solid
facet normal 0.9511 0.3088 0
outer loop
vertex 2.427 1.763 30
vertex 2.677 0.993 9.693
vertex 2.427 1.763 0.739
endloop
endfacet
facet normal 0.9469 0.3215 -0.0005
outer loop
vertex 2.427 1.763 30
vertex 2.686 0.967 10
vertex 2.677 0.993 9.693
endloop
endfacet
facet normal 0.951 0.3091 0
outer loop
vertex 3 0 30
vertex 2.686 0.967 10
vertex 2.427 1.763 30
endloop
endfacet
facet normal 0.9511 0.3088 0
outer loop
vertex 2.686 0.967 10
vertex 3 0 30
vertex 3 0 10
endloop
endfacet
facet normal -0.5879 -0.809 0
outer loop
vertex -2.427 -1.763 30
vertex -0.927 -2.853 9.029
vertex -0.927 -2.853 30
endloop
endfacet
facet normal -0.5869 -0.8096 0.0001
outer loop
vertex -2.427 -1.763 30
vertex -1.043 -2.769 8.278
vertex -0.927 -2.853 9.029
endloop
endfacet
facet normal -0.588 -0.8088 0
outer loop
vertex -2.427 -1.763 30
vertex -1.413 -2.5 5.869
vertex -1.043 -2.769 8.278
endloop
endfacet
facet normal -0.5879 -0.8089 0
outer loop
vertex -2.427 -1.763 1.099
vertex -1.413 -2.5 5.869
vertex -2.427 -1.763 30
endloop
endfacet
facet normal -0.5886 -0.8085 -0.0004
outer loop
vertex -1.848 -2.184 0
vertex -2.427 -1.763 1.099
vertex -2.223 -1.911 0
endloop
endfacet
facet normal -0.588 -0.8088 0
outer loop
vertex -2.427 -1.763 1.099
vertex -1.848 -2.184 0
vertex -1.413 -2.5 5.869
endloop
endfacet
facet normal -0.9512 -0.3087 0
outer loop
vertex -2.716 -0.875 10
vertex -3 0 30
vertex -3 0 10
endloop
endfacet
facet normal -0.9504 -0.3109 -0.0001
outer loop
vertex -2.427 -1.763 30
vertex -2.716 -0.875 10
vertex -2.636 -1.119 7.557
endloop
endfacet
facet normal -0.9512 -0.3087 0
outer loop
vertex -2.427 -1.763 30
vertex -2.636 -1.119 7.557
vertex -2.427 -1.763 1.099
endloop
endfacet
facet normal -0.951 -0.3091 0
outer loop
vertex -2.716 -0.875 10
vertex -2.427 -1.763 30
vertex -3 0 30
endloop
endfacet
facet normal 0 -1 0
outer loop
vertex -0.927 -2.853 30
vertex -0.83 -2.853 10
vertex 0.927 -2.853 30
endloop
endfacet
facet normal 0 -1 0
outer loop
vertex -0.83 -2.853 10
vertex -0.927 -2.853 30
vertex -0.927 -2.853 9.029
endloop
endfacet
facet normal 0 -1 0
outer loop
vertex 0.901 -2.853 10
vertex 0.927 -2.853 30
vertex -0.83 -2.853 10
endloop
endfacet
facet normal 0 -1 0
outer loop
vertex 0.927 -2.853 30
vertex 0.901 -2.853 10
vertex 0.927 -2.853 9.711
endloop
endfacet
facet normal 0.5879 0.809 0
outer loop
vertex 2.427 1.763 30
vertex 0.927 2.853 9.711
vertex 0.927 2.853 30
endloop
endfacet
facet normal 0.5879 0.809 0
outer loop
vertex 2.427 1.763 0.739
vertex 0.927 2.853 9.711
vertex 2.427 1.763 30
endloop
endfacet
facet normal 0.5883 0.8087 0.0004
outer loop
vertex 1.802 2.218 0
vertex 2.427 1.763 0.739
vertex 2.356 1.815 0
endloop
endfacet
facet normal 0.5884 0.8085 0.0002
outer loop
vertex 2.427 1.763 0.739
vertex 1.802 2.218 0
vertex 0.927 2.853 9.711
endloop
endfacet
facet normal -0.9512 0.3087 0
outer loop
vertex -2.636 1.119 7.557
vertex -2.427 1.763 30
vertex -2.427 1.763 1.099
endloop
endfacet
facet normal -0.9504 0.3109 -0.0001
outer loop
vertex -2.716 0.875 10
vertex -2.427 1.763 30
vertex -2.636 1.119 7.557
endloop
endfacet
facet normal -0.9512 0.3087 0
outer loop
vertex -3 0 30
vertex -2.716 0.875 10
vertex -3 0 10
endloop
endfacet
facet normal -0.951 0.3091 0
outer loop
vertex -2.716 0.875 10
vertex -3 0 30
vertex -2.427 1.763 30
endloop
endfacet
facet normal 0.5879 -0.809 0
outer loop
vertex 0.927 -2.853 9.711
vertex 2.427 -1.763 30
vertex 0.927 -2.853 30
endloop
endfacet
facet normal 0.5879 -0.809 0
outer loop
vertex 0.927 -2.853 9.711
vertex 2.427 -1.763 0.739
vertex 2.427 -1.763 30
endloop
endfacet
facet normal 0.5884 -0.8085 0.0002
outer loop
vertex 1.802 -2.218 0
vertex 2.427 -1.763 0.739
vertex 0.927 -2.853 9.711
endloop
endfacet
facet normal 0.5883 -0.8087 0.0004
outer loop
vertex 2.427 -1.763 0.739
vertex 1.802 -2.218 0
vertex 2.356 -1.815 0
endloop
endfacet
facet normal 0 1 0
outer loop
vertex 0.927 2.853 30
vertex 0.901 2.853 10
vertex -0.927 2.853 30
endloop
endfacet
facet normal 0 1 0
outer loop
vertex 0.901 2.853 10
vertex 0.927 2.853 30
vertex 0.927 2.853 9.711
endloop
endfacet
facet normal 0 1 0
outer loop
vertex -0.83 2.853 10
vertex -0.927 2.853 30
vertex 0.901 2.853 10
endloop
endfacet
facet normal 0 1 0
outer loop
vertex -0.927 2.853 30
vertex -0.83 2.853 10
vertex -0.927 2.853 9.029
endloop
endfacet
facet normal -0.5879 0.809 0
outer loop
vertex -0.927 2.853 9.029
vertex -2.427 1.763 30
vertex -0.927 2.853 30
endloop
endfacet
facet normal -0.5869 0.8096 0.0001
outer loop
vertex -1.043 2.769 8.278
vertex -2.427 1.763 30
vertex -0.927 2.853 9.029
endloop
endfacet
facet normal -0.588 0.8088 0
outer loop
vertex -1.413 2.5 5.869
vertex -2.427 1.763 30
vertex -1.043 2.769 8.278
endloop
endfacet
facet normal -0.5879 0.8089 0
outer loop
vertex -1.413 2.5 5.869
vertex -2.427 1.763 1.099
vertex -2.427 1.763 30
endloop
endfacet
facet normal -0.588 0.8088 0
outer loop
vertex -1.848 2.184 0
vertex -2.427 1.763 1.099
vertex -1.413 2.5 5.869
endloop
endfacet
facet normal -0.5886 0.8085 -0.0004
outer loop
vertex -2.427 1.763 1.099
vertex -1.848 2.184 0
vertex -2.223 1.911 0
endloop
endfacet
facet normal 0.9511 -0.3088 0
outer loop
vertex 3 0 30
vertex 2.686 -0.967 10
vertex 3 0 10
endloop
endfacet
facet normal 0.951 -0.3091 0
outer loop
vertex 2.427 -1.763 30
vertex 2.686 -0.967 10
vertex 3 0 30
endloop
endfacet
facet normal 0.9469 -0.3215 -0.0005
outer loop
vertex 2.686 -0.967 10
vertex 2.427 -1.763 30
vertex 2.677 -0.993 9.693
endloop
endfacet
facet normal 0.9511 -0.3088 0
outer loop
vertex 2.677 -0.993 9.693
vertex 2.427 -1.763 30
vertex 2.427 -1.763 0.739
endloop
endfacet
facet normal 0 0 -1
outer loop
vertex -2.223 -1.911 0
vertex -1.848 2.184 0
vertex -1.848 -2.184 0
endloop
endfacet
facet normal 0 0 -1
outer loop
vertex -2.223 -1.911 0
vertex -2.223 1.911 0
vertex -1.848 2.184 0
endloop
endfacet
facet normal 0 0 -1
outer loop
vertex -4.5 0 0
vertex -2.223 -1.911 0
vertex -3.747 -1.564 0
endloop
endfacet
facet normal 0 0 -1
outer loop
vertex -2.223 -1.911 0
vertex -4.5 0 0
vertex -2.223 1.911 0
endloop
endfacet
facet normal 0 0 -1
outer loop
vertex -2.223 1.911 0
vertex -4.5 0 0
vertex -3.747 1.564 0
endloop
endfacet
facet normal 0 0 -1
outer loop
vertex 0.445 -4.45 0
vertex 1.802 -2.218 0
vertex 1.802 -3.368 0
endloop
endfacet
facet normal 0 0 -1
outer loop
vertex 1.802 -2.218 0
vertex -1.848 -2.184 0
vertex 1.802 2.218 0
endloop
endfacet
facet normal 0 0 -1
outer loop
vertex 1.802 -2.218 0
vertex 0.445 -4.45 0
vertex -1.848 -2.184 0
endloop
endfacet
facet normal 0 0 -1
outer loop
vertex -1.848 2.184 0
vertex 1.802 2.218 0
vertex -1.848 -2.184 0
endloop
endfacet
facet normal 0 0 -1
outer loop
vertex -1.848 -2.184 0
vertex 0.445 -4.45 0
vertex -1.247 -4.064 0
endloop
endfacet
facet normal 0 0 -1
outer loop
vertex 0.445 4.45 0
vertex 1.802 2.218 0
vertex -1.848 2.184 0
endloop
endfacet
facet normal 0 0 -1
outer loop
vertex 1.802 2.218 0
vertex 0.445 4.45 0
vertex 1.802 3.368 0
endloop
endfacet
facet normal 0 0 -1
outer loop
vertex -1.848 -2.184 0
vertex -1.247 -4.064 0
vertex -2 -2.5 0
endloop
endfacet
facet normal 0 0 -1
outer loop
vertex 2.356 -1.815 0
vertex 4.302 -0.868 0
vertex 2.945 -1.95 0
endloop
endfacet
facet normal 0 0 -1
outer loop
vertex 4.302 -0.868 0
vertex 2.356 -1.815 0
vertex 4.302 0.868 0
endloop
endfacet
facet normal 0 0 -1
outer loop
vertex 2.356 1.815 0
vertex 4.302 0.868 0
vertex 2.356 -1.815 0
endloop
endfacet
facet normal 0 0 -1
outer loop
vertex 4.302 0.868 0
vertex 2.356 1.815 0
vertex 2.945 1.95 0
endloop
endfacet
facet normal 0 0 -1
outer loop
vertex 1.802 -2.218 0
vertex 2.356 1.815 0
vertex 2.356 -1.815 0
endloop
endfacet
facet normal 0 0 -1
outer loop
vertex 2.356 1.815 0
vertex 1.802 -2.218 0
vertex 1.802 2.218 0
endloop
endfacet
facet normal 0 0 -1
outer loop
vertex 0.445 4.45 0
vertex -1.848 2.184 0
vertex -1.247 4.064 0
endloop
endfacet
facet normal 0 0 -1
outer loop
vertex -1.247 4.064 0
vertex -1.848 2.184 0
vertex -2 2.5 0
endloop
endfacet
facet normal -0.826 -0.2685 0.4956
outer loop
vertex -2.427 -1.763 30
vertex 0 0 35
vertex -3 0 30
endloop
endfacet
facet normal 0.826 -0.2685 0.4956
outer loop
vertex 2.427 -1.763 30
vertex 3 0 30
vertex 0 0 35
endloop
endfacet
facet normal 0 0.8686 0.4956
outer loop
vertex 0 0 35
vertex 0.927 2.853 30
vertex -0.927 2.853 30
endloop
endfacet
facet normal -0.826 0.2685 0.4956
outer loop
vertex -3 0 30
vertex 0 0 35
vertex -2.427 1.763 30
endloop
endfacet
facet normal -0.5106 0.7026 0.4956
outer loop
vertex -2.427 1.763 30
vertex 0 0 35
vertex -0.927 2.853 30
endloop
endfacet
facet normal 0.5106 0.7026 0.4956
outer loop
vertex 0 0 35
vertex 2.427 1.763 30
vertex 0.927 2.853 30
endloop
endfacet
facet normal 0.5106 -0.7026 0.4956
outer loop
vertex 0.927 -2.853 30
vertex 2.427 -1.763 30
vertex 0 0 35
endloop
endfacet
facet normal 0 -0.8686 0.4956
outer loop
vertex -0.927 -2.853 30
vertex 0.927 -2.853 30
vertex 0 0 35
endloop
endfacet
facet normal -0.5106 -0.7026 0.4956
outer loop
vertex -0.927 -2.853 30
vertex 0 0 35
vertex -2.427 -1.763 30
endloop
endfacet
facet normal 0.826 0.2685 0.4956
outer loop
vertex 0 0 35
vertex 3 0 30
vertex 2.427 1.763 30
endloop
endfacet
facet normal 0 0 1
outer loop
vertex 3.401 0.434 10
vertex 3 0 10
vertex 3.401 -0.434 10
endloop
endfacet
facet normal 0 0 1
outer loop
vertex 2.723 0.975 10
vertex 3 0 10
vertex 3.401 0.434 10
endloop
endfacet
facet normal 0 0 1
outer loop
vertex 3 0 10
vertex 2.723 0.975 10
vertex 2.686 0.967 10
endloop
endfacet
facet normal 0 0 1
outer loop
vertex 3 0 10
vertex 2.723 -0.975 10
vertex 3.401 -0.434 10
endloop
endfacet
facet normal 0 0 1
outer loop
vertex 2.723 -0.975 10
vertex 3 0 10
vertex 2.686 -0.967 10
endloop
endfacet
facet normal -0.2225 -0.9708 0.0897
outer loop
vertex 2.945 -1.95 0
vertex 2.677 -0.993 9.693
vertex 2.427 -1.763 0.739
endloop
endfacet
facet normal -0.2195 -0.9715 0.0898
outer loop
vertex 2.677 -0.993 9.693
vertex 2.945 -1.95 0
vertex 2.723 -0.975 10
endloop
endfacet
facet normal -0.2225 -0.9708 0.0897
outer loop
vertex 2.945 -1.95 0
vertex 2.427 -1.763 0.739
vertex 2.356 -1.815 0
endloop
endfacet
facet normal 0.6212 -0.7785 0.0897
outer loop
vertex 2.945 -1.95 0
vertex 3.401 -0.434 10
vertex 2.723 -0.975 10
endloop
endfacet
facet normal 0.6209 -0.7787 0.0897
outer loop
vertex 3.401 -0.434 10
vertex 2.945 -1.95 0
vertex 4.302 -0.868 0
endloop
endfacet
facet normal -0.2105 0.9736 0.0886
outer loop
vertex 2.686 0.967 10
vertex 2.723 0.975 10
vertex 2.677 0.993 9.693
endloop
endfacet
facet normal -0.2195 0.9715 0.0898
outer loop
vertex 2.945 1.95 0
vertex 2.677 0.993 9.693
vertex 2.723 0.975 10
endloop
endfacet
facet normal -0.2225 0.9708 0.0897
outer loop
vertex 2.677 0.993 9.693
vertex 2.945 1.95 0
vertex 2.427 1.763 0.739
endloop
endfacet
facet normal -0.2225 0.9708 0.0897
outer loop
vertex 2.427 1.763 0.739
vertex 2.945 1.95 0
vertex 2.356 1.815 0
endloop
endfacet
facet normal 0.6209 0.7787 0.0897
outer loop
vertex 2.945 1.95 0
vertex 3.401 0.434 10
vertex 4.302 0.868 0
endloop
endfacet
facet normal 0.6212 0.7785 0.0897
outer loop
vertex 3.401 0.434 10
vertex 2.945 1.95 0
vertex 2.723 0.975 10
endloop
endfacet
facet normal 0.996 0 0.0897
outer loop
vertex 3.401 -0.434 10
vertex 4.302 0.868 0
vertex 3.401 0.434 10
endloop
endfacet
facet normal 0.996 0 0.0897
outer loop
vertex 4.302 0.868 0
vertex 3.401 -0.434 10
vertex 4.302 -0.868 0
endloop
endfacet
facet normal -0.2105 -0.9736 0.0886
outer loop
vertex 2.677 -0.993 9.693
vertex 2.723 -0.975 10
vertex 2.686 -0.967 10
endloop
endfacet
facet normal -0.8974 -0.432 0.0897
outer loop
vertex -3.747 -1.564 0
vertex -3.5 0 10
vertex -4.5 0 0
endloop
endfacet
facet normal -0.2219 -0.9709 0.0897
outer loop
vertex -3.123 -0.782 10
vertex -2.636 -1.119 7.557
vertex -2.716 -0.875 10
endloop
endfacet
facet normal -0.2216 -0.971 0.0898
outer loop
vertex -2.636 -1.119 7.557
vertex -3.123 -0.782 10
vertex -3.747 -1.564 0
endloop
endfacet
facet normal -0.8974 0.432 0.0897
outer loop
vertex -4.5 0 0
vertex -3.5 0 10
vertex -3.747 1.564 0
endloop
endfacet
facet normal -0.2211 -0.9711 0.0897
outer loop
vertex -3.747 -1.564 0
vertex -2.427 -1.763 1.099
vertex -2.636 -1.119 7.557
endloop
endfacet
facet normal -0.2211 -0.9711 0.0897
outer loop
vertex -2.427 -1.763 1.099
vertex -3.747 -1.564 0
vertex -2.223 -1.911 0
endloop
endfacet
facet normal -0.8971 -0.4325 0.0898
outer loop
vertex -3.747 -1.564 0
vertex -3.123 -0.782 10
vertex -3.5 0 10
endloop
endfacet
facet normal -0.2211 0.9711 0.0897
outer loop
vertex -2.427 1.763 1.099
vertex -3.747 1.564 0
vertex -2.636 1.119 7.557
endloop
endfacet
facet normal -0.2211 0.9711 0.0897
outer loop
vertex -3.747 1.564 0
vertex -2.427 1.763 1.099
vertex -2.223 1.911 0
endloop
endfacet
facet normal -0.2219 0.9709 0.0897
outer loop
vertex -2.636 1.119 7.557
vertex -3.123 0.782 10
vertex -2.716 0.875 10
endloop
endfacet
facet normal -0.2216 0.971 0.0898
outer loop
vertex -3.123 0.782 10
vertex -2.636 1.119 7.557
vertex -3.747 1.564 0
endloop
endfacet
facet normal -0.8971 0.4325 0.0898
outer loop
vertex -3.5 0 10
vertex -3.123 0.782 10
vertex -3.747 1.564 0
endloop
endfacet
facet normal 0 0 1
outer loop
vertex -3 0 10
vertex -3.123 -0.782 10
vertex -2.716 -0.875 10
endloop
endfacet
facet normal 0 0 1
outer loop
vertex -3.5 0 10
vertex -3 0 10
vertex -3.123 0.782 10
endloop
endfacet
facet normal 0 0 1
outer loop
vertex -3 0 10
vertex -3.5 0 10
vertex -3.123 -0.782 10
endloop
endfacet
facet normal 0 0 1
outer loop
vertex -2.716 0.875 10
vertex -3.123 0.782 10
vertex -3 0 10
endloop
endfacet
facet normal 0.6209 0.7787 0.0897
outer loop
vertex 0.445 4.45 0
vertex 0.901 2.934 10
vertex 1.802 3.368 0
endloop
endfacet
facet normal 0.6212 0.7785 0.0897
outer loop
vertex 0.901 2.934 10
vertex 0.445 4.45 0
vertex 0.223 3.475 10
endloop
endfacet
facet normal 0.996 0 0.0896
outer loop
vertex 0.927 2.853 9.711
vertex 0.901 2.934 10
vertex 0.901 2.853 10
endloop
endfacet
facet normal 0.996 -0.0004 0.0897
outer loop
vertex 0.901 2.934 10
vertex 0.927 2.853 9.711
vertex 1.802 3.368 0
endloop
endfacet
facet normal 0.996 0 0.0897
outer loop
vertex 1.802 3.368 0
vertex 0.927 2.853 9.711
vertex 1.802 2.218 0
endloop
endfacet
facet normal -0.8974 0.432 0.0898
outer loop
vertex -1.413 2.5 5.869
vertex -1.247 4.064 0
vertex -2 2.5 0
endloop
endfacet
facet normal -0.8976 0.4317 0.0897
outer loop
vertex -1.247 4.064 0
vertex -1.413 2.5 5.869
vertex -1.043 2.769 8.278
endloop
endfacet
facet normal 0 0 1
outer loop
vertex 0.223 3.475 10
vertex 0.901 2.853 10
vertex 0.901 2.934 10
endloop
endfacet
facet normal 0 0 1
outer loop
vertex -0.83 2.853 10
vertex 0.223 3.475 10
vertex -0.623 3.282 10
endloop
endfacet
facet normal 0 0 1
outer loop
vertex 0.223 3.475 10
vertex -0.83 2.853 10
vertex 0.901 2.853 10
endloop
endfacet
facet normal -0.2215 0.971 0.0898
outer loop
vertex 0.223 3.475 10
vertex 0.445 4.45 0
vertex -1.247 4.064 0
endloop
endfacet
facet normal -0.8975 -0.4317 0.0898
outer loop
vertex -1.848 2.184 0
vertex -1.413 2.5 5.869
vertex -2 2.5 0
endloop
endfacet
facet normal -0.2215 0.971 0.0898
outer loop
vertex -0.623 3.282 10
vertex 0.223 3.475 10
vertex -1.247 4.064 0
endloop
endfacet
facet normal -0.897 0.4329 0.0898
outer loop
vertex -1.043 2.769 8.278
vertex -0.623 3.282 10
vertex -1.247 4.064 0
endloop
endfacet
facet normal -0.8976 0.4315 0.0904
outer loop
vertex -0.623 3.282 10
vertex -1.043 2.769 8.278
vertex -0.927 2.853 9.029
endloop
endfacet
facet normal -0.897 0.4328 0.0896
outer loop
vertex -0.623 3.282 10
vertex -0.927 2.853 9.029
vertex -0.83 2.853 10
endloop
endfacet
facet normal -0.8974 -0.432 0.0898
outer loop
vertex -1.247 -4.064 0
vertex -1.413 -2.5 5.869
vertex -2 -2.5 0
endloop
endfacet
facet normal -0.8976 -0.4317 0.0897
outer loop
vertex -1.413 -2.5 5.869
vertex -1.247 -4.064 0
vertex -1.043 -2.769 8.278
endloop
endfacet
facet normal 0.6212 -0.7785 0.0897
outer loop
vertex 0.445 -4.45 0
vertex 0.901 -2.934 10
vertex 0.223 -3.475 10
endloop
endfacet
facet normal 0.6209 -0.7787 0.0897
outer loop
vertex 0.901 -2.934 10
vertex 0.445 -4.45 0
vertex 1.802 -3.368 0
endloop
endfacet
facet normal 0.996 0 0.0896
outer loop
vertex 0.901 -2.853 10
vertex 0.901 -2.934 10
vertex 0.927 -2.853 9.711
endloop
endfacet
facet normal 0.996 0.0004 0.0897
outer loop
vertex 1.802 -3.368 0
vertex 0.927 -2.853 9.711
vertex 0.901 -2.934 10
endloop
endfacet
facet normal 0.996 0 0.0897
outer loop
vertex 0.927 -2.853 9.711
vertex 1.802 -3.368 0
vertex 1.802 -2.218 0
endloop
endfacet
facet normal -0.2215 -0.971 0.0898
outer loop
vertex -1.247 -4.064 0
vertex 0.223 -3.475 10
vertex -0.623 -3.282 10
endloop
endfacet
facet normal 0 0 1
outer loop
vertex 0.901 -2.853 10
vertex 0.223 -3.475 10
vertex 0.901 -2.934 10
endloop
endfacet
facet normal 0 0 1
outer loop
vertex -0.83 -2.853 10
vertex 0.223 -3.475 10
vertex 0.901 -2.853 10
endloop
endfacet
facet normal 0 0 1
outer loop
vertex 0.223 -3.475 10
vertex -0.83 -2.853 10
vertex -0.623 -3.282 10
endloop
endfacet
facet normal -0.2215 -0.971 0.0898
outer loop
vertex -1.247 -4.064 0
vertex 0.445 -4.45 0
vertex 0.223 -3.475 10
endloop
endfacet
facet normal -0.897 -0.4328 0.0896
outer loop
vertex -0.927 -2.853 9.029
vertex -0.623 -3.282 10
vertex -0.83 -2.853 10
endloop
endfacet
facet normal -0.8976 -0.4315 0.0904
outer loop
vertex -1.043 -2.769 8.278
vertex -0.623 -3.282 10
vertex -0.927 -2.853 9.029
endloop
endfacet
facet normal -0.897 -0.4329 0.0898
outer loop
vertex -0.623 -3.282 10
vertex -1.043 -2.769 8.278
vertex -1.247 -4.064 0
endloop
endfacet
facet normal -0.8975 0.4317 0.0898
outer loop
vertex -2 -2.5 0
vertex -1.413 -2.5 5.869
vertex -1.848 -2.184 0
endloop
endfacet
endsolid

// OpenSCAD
  module rocket(hh=5, eh=10, rh=30, z=-1) {
    rotate([0,0,180]) {
    cylinder(h=rh, r=3);
    translate([0,0,rh]) cylinder(h=hh, r1=3, r2=0);
    translate([-2.5,0,z]) cylinder(h=eh, r1=2, r2=1);
    translate([2.5,0,z]) cylinder(h=eh, r1=2, r2=1);
    translate([0,-2.5,z]) cylinder(h=eh, r1=2, r2=1);
    translate([0,2.5,z]) cylinder(h=eh, r1=2, r2=1);  
    }
  }

  rocket(z=0);
